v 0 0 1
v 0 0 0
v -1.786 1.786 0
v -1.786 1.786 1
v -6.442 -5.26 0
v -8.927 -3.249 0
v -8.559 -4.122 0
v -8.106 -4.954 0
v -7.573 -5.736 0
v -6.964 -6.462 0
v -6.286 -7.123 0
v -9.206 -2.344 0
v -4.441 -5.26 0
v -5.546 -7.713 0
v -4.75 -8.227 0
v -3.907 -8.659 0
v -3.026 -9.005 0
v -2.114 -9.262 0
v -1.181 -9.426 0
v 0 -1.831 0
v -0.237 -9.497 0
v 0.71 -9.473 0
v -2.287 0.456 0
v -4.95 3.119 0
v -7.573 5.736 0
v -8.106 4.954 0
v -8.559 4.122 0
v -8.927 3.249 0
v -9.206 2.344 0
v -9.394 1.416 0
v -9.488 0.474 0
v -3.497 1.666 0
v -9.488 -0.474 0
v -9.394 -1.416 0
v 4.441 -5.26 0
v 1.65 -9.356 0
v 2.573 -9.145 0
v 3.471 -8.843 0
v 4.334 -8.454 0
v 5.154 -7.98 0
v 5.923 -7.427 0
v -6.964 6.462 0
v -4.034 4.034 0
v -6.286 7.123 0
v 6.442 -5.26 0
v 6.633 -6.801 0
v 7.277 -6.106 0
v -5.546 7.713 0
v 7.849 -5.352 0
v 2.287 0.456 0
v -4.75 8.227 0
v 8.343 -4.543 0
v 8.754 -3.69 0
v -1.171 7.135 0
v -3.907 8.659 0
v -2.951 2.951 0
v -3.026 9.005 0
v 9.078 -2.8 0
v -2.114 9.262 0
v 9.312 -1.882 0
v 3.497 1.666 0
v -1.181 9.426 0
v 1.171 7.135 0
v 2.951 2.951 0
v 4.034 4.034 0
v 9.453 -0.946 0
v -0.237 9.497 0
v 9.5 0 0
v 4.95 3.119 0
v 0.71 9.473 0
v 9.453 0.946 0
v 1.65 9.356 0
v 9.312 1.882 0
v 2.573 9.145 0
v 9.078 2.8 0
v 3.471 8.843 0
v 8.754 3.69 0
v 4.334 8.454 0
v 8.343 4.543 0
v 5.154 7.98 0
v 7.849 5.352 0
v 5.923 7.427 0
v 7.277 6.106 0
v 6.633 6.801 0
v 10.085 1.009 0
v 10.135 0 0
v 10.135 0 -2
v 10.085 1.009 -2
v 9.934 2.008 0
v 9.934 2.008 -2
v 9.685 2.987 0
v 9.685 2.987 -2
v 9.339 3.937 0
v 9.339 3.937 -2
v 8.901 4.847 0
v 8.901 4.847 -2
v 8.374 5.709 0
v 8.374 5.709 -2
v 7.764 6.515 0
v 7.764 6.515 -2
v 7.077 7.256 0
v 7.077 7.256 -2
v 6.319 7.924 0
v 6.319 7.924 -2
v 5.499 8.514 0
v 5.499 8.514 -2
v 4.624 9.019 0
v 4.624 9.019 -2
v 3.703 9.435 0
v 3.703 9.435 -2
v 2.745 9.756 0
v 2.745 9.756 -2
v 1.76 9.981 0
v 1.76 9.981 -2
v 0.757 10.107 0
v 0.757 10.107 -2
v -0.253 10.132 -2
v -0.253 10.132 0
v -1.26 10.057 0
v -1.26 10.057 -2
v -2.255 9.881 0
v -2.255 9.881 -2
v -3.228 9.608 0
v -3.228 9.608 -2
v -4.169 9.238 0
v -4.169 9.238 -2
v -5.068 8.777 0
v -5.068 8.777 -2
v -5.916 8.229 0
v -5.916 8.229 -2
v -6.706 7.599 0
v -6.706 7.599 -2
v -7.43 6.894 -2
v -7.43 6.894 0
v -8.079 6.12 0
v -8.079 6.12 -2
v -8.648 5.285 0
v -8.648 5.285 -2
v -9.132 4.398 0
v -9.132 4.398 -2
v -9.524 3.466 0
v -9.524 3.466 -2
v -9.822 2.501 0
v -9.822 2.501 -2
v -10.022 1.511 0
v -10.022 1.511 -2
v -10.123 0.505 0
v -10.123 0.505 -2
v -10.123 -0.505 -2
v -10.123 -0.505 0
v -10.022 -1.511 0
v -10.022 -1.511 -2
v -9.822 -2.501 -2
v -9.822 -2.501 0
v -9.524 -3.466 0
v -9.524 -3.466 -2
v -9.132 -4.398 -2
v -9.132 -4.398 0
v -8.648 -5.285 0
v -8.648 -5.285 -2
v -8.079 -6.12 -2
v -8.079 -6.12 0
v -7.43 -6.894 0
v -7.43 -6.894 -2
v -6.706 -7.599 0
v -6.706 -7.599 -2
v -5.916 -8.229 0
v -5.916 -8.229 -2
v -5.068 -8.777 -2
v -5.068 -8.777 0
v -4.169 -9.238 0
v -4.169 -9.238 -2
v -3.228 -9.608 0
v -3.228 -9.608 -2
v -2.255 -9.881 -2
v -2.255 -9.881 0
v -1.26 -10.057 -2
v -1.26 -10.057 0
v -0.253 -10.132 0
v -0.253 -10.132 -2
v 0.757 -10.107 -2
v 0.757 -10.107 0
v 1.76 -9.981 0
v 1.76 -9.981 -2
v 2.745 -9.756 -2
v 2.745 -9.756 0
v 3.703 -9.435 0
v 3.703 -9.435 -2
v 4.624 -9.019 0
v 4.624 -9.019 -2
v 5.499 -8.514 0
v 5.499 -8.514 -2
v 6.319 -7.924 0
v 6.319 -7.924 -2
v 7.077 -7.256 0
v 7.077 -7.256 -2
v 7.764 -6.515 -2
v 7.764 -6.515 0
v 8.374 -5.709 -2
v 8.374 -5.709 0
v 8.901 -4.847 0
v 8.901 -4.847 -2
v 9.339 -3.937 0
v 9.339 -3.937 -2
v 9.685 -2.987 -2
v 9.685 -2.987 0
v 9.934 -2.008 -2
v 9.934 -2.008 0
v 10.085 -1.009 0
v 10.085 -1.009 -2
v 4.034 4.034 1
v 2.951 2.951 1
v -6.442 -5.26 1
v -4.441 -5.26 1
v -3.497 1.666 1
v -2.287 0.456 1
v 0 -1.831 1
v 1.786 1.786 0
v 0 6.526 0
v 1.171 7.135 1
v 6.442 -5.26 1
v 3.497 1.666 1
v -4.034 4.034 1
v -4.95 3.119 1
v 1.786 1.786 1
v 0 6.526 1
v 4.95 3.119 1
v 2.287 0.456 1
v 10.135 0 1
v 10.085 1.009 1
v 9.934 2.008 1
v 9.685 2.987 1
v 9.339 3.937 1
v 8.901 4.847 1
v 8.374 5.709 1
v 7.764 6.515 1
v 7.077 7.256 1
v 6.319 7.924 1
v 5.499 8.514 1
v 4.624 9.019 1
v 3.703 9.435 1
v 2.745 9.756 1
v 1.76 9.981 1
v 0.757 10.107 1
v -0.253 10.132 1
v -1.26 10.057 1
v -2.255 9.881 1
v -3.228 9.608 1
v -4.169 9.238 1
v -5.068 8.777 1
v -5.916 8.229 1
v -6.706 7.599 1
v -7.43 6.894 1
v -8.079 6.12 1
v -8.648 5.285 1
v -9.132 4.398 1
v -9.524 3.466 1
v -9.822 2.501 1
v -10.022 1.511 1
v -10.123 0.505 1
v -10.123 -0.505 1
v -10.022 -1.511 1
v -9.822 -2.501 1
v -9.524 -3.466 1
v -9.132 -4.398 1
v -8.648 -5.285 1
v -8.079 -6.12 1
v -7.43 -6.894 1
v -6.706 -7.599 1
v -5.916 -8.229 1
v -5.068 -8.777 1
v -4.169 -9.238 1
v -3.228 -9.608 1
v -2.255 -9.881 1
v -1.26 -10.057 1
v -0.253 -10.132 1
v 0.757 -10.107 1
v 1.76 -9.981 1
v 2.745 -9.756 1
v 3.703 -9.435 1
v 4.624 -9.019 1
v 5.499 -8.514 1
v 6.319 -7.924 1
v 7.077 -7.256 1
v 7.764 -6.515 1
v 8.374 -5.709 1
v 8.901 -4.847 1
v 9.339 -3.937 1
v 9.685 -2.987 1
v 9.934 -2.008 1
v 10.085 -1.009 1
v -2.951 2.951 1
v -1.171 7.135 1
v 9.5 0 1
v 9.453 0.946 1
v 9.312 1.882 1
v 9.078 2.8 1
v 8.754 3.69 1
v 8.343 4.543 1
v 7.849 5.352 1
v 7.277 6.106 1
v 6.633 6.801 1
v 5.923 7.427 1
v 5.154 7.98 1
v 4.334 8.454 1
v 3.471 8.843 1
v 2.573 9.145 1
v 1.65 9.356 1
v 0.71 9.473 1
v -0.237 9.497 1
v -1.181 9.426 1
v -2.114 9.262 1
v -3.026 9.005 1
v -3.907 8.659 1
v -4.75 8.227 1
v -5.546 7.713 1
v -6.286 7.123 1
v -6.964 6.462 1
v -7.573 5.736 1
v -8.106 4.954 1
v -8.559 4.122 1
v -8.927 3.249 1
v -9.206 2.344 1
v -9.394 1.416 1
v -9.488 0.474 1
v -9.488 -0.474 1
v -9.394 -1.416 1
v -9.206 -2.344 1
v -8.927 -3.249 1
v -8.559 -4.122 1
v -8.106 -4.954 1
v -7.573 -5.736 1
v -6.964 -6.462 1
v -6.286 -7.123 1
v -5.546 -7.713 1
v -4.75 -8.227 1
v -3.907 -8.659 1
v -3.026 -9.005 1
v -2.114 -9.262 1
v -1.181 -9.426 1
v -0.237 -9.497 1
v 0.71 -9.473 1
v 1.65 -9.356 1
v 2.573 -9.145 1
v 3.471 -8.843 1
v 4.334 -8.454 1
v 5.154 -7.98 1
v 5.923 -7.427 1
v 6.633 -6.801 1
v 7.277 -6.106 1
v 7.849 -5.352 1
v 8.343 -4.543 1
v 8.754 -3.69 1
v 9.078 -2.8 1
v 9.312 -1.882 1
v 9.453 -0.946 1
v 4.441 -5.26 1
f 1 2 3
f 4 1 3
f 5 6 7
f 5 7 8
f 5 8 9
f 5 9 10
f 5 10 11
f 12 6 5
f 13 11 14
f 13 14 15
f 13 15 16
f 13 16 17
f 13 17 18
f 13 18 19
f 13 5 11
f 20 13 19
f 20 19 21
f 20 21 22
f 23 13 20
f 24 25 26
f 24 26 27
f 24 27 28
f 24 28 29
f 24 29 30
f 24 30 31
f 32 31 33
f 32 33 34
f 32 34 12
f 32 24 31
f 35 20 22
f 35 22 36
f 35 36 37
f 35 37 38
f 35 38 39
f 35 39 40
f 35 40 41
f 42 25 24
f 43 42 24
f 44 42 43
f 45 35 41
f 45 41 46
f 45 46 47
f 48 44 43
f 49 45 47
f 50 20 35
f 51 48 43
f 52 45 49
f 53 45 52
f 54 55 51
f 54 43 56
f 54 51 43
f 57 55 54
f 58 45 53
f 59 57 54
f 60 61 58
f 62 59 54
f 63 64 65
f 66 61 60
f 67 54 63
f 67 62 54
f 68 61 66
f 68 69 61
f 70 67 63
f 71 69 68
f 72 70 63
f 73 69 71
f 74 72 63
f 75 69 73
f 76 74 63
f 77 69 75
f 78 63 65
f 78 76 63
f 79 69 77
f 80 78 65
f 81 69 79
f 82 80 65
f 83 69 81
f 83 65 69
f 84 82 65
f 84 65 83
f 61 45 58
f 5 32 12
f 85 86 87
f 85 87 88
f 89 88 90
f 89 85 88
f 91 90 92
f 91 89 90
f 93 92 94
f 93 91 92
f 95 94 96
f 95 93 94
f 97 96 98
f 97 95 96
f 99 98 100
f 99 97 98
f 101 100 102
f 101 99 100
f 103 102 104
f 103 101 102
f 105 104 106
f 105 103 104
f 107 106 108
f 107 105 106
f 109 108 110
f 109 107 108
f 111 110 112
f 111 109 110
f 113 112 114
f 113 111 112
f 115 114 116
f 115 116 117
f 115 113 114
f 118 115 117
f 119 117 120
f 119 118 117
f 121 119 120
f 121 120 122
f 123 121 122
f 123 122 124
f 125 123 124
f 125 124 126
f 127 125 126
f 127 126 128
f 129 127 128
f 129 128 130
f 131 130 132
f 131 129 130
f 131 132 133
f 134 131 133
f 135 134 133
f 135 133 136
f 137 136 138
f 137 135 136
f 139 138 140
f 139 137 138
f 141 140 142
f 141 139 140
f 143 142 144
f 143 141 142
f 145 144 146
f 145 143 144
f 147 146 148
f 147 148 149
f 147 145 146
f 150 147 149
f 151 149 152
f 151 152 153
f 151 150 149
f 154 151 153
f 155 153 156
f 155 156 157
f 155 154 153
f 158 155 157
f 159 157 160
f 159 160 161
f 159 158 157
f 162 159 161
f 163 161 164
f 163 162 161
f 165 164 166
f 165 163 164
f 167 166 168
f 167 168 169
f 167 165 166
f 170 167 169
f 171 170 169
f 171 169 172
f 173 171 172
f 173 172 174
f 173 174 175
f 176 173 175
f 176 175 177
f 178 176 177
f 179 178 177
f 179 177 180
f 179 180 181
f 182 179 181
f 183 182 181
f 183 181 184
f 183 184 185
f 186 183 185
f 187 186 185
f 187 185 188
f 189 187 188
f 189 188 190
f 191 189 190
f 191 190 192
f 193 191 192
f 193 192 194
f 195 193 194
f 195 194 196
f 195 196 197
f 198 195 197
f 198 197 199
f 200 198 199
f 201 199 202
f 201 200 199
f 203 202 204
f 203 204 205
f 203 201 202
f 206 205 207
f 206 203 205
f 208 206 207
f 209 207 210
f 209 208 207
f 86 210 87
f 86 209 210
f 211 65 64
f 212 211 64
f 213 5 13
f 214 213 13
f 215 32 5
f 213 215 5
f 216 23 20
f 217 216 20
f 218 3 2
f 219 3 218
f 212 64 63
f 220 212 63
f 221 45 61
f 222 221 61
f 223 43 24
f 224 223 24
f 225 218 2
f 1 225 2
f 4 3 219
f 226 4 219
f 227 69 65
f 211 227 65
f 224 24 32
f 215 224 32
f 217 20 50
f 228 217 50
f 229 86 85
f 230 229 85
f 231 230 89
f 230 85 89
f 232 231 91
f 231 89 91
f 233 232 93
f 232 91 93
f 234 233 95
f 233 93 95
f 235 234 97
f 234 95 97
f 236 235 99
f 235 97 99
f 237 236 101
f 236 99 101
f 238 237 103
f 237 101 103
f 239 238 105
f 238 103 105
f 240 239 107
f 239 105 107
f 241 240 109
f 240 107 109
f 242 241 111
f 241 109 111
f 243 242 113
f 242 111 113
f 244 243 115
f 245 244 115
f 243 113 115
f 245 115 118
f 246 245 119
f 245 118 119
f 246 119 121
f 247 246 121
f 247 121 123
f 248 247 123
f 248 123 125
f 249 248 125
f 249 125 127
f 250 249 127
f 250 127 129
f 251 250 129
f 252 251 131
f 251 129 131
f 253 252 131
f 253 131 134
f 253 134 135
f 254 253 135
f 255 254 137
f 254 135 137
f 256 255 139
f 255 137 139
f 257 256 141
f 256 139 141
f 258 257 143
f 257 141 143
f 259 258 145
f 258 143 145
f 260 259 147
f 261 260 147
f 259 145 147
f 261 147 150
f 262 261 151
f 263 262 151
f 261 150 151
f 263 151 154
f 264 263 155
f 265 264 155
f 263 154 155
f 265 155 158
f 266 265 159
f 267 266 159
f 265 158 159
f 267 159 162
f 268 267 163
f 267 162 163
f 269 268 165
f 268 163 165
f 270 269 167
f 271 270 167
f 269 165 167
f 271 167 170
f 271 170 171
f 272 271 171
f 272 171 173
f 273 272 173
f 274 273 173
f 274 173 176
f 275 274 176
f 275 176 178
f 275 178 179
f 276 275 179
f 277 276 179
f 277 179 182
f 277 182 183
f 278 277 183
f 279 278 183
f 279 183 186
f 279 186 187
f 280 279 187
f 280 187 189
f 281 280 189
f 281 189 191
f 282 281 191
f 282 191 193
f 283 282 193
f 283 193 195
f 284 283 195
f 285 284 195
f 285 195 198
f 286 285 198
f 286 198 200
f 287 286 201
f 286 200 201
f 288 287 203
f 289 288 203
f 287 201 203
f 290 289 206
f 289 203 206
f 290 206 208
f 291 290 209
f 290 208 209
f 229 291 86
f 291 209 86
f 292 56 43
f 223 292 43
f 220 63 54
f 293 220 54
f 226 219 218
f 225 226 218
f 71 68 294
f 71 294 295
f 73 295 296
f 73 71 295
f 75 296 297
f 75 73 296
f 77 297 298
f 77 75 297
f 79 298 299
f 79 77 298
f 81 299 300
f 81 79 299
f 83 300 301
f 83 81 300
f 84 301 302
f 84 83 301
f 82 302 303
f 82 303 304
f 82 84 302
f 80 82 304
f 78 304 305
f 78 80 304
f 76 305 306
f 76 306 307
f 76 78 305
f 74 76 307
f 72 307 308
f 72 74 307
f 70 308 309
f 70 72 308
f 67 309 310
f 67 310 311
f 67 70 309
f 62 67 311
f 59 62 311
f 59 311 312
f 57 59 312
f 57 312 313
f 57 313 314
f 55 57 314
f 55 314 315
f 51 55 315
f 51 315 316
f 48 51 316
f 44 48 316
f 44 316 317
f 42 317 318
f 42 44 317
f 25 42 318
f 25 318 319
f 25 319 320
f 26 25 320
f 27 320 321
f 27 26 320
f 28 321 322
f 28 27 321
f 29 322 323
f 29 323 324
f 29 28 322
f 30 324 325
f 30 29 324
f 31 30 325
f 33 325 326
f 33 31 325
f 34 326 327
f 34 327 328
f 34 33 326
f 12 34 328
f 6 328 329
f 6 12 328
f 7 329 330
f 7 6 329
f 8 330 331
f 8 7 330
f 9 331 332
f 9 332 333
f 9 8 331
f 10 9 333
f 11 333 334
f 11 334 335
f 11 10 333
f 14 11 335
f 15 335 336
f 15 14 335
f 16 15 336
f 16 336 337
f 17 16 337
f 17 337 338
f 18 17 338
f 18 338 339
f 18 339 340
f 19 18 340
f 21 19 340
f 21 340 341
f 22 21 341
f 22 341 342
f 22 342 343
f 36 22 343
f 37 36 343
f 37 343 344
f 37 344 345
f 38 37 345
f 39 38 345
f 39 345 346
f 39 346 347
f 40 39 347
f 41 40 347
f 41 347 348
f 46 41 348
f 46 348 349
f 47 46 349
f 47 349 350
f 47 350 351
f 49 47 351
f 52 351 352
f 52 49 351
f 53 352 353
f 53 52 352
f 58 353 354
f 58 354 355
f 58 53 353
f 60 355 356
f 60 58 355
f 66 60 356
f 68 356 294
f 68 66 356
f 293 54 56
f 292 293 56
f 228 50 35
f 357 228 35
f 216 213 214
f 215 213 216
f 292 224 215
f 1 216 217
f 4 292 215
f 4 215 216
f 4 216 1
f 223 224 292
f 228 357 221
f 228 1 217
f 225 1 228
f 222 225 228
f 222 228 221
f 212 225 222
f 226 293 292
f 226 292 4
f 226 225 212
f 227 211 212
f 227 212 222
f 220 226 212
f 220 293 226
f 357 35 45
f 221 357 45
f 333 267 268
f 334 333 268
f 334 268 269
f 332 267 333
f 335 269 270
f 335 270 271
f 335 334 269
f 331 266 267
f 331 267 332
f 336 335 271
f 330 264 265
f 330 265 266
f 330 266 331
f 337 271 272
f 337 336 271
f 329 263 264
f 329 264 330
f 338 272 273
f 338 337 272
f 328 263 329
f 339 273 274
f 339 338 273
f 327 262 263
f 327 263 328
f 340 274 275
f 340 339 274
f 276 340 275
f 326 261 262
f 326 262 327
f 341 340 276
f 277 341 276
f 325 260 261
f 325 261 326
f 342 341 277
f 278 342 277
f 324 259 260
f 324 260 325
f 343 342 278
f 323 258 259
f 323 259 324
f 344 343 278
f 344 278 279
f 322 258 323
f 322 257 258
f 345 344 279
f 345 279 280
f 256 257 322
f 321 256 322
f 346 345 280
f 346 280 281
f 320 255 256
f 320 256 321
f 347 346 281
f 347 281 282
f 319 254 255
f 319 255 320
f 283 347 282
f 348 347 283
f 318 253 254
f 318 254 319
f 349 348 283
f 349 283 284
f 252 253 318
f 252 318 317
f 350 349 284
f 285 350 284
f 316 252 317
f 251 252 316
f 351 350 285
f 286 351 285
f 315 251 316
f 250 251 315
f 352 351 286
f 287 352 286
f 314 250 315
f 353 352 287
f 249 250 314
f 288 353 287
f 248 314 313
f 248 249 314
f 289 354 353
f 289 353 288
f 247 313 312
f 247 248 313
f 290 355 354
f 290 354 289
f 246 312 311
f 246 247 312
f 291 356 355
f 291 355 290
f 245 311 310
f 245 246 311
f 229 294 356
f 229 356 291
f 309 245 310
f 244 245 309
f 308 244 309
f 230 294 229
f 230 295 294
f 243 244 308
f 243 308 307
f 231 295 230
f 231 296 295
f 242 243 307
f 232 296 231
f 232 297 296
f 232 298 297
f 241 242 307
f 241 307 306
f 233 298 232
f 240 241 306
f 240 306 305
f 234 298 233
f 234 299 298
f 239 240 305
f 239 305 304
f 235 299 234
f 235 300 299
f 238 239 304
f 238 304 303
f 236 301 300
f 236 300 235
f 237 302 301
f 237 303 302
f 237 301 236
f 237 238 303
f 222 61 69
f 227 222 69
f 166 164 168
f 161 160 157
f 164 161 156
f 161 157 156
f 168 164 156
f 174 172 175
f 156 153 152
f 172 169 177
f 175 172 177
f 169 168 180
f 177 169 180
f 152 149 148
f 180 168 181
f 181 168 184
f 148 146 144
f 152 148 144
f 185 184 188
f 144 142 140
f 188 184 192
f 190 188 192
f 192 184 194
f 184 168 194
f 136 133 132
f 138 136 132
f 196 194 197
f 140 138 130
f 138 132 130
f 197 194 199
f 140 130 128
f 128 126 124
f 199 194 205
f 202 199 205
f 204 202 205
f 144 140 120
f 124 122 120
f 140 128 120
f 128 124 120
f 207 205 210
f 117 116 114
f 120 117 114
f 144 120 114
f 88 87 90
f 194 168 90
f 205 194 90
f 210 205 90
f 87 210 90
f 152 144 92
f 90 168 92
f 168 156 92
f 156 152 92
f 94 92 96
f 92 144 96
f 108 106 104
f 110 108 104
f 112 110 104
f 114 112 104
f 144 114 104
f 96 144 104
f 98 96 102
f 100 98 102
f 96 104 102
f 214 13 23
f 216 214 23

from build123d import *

# Parameters (mm, degrees)
F0_R     = 10.135287
F1_DEPTH = 2
F3_DEPTH = 1
F4_R     = 10.135287
F4_R_2   = 9.5
F5_DEPTH = 1


with BuildPart() as f1:
    # F0 (on Top) → F1 (new body)
    with BuildSketch(Plane.XY):
        Circle(F0_R)
    extrude(amount=-F1_DEPTH)

    # F2 (on face) → F3 (join)
    with BuildSketch(Plane.XY):
        Polygon((6.441801, -5.260301), (3.496772, 1.665972), (2.287066, 0.456266), (4.44094, -5.260301), align=None)
        Polygon((0, 6.526335), (1.786038, 1.786038), (2.950567, 2.950567), (1.171237, 7.135287), (-1.171237, 7.135287), (-2.950567, 2.950567), (-1.786038, 1.786038), align=None)
        Polygon((-2.287066, 0.456266), (-3.496772, 1.665972), (-6.441801, -5.260301), (-4.44094, -5.260301), align=None)
        Polygon((1.786038, 1.786038), (0, 0), (-1.786038, 1.786038), (-2.950567, 2.950567), (-4.034347, 4.034347), (-4.949747, 3.118947), (-3.496772, 1.665972), (-2.287066, 0.456266), (0, -1.8308), (2.287066, 0.456266), (3.496772, 1.665972), (4.949747, 3.118947), (4.034347, 4.034347), (2.950567, 2.950567), align=None)
    extrude(amount=F3_DEPTH)

    # F4 (on face) → F5 (join)
    with BuildSketch(Plane.XY):
        Circle(F4_R)
        Circle(F4_R_2, mode=Mode.SUBTRACT)
    extrude(amount=F5_DEPTH)


solid = f1.part
